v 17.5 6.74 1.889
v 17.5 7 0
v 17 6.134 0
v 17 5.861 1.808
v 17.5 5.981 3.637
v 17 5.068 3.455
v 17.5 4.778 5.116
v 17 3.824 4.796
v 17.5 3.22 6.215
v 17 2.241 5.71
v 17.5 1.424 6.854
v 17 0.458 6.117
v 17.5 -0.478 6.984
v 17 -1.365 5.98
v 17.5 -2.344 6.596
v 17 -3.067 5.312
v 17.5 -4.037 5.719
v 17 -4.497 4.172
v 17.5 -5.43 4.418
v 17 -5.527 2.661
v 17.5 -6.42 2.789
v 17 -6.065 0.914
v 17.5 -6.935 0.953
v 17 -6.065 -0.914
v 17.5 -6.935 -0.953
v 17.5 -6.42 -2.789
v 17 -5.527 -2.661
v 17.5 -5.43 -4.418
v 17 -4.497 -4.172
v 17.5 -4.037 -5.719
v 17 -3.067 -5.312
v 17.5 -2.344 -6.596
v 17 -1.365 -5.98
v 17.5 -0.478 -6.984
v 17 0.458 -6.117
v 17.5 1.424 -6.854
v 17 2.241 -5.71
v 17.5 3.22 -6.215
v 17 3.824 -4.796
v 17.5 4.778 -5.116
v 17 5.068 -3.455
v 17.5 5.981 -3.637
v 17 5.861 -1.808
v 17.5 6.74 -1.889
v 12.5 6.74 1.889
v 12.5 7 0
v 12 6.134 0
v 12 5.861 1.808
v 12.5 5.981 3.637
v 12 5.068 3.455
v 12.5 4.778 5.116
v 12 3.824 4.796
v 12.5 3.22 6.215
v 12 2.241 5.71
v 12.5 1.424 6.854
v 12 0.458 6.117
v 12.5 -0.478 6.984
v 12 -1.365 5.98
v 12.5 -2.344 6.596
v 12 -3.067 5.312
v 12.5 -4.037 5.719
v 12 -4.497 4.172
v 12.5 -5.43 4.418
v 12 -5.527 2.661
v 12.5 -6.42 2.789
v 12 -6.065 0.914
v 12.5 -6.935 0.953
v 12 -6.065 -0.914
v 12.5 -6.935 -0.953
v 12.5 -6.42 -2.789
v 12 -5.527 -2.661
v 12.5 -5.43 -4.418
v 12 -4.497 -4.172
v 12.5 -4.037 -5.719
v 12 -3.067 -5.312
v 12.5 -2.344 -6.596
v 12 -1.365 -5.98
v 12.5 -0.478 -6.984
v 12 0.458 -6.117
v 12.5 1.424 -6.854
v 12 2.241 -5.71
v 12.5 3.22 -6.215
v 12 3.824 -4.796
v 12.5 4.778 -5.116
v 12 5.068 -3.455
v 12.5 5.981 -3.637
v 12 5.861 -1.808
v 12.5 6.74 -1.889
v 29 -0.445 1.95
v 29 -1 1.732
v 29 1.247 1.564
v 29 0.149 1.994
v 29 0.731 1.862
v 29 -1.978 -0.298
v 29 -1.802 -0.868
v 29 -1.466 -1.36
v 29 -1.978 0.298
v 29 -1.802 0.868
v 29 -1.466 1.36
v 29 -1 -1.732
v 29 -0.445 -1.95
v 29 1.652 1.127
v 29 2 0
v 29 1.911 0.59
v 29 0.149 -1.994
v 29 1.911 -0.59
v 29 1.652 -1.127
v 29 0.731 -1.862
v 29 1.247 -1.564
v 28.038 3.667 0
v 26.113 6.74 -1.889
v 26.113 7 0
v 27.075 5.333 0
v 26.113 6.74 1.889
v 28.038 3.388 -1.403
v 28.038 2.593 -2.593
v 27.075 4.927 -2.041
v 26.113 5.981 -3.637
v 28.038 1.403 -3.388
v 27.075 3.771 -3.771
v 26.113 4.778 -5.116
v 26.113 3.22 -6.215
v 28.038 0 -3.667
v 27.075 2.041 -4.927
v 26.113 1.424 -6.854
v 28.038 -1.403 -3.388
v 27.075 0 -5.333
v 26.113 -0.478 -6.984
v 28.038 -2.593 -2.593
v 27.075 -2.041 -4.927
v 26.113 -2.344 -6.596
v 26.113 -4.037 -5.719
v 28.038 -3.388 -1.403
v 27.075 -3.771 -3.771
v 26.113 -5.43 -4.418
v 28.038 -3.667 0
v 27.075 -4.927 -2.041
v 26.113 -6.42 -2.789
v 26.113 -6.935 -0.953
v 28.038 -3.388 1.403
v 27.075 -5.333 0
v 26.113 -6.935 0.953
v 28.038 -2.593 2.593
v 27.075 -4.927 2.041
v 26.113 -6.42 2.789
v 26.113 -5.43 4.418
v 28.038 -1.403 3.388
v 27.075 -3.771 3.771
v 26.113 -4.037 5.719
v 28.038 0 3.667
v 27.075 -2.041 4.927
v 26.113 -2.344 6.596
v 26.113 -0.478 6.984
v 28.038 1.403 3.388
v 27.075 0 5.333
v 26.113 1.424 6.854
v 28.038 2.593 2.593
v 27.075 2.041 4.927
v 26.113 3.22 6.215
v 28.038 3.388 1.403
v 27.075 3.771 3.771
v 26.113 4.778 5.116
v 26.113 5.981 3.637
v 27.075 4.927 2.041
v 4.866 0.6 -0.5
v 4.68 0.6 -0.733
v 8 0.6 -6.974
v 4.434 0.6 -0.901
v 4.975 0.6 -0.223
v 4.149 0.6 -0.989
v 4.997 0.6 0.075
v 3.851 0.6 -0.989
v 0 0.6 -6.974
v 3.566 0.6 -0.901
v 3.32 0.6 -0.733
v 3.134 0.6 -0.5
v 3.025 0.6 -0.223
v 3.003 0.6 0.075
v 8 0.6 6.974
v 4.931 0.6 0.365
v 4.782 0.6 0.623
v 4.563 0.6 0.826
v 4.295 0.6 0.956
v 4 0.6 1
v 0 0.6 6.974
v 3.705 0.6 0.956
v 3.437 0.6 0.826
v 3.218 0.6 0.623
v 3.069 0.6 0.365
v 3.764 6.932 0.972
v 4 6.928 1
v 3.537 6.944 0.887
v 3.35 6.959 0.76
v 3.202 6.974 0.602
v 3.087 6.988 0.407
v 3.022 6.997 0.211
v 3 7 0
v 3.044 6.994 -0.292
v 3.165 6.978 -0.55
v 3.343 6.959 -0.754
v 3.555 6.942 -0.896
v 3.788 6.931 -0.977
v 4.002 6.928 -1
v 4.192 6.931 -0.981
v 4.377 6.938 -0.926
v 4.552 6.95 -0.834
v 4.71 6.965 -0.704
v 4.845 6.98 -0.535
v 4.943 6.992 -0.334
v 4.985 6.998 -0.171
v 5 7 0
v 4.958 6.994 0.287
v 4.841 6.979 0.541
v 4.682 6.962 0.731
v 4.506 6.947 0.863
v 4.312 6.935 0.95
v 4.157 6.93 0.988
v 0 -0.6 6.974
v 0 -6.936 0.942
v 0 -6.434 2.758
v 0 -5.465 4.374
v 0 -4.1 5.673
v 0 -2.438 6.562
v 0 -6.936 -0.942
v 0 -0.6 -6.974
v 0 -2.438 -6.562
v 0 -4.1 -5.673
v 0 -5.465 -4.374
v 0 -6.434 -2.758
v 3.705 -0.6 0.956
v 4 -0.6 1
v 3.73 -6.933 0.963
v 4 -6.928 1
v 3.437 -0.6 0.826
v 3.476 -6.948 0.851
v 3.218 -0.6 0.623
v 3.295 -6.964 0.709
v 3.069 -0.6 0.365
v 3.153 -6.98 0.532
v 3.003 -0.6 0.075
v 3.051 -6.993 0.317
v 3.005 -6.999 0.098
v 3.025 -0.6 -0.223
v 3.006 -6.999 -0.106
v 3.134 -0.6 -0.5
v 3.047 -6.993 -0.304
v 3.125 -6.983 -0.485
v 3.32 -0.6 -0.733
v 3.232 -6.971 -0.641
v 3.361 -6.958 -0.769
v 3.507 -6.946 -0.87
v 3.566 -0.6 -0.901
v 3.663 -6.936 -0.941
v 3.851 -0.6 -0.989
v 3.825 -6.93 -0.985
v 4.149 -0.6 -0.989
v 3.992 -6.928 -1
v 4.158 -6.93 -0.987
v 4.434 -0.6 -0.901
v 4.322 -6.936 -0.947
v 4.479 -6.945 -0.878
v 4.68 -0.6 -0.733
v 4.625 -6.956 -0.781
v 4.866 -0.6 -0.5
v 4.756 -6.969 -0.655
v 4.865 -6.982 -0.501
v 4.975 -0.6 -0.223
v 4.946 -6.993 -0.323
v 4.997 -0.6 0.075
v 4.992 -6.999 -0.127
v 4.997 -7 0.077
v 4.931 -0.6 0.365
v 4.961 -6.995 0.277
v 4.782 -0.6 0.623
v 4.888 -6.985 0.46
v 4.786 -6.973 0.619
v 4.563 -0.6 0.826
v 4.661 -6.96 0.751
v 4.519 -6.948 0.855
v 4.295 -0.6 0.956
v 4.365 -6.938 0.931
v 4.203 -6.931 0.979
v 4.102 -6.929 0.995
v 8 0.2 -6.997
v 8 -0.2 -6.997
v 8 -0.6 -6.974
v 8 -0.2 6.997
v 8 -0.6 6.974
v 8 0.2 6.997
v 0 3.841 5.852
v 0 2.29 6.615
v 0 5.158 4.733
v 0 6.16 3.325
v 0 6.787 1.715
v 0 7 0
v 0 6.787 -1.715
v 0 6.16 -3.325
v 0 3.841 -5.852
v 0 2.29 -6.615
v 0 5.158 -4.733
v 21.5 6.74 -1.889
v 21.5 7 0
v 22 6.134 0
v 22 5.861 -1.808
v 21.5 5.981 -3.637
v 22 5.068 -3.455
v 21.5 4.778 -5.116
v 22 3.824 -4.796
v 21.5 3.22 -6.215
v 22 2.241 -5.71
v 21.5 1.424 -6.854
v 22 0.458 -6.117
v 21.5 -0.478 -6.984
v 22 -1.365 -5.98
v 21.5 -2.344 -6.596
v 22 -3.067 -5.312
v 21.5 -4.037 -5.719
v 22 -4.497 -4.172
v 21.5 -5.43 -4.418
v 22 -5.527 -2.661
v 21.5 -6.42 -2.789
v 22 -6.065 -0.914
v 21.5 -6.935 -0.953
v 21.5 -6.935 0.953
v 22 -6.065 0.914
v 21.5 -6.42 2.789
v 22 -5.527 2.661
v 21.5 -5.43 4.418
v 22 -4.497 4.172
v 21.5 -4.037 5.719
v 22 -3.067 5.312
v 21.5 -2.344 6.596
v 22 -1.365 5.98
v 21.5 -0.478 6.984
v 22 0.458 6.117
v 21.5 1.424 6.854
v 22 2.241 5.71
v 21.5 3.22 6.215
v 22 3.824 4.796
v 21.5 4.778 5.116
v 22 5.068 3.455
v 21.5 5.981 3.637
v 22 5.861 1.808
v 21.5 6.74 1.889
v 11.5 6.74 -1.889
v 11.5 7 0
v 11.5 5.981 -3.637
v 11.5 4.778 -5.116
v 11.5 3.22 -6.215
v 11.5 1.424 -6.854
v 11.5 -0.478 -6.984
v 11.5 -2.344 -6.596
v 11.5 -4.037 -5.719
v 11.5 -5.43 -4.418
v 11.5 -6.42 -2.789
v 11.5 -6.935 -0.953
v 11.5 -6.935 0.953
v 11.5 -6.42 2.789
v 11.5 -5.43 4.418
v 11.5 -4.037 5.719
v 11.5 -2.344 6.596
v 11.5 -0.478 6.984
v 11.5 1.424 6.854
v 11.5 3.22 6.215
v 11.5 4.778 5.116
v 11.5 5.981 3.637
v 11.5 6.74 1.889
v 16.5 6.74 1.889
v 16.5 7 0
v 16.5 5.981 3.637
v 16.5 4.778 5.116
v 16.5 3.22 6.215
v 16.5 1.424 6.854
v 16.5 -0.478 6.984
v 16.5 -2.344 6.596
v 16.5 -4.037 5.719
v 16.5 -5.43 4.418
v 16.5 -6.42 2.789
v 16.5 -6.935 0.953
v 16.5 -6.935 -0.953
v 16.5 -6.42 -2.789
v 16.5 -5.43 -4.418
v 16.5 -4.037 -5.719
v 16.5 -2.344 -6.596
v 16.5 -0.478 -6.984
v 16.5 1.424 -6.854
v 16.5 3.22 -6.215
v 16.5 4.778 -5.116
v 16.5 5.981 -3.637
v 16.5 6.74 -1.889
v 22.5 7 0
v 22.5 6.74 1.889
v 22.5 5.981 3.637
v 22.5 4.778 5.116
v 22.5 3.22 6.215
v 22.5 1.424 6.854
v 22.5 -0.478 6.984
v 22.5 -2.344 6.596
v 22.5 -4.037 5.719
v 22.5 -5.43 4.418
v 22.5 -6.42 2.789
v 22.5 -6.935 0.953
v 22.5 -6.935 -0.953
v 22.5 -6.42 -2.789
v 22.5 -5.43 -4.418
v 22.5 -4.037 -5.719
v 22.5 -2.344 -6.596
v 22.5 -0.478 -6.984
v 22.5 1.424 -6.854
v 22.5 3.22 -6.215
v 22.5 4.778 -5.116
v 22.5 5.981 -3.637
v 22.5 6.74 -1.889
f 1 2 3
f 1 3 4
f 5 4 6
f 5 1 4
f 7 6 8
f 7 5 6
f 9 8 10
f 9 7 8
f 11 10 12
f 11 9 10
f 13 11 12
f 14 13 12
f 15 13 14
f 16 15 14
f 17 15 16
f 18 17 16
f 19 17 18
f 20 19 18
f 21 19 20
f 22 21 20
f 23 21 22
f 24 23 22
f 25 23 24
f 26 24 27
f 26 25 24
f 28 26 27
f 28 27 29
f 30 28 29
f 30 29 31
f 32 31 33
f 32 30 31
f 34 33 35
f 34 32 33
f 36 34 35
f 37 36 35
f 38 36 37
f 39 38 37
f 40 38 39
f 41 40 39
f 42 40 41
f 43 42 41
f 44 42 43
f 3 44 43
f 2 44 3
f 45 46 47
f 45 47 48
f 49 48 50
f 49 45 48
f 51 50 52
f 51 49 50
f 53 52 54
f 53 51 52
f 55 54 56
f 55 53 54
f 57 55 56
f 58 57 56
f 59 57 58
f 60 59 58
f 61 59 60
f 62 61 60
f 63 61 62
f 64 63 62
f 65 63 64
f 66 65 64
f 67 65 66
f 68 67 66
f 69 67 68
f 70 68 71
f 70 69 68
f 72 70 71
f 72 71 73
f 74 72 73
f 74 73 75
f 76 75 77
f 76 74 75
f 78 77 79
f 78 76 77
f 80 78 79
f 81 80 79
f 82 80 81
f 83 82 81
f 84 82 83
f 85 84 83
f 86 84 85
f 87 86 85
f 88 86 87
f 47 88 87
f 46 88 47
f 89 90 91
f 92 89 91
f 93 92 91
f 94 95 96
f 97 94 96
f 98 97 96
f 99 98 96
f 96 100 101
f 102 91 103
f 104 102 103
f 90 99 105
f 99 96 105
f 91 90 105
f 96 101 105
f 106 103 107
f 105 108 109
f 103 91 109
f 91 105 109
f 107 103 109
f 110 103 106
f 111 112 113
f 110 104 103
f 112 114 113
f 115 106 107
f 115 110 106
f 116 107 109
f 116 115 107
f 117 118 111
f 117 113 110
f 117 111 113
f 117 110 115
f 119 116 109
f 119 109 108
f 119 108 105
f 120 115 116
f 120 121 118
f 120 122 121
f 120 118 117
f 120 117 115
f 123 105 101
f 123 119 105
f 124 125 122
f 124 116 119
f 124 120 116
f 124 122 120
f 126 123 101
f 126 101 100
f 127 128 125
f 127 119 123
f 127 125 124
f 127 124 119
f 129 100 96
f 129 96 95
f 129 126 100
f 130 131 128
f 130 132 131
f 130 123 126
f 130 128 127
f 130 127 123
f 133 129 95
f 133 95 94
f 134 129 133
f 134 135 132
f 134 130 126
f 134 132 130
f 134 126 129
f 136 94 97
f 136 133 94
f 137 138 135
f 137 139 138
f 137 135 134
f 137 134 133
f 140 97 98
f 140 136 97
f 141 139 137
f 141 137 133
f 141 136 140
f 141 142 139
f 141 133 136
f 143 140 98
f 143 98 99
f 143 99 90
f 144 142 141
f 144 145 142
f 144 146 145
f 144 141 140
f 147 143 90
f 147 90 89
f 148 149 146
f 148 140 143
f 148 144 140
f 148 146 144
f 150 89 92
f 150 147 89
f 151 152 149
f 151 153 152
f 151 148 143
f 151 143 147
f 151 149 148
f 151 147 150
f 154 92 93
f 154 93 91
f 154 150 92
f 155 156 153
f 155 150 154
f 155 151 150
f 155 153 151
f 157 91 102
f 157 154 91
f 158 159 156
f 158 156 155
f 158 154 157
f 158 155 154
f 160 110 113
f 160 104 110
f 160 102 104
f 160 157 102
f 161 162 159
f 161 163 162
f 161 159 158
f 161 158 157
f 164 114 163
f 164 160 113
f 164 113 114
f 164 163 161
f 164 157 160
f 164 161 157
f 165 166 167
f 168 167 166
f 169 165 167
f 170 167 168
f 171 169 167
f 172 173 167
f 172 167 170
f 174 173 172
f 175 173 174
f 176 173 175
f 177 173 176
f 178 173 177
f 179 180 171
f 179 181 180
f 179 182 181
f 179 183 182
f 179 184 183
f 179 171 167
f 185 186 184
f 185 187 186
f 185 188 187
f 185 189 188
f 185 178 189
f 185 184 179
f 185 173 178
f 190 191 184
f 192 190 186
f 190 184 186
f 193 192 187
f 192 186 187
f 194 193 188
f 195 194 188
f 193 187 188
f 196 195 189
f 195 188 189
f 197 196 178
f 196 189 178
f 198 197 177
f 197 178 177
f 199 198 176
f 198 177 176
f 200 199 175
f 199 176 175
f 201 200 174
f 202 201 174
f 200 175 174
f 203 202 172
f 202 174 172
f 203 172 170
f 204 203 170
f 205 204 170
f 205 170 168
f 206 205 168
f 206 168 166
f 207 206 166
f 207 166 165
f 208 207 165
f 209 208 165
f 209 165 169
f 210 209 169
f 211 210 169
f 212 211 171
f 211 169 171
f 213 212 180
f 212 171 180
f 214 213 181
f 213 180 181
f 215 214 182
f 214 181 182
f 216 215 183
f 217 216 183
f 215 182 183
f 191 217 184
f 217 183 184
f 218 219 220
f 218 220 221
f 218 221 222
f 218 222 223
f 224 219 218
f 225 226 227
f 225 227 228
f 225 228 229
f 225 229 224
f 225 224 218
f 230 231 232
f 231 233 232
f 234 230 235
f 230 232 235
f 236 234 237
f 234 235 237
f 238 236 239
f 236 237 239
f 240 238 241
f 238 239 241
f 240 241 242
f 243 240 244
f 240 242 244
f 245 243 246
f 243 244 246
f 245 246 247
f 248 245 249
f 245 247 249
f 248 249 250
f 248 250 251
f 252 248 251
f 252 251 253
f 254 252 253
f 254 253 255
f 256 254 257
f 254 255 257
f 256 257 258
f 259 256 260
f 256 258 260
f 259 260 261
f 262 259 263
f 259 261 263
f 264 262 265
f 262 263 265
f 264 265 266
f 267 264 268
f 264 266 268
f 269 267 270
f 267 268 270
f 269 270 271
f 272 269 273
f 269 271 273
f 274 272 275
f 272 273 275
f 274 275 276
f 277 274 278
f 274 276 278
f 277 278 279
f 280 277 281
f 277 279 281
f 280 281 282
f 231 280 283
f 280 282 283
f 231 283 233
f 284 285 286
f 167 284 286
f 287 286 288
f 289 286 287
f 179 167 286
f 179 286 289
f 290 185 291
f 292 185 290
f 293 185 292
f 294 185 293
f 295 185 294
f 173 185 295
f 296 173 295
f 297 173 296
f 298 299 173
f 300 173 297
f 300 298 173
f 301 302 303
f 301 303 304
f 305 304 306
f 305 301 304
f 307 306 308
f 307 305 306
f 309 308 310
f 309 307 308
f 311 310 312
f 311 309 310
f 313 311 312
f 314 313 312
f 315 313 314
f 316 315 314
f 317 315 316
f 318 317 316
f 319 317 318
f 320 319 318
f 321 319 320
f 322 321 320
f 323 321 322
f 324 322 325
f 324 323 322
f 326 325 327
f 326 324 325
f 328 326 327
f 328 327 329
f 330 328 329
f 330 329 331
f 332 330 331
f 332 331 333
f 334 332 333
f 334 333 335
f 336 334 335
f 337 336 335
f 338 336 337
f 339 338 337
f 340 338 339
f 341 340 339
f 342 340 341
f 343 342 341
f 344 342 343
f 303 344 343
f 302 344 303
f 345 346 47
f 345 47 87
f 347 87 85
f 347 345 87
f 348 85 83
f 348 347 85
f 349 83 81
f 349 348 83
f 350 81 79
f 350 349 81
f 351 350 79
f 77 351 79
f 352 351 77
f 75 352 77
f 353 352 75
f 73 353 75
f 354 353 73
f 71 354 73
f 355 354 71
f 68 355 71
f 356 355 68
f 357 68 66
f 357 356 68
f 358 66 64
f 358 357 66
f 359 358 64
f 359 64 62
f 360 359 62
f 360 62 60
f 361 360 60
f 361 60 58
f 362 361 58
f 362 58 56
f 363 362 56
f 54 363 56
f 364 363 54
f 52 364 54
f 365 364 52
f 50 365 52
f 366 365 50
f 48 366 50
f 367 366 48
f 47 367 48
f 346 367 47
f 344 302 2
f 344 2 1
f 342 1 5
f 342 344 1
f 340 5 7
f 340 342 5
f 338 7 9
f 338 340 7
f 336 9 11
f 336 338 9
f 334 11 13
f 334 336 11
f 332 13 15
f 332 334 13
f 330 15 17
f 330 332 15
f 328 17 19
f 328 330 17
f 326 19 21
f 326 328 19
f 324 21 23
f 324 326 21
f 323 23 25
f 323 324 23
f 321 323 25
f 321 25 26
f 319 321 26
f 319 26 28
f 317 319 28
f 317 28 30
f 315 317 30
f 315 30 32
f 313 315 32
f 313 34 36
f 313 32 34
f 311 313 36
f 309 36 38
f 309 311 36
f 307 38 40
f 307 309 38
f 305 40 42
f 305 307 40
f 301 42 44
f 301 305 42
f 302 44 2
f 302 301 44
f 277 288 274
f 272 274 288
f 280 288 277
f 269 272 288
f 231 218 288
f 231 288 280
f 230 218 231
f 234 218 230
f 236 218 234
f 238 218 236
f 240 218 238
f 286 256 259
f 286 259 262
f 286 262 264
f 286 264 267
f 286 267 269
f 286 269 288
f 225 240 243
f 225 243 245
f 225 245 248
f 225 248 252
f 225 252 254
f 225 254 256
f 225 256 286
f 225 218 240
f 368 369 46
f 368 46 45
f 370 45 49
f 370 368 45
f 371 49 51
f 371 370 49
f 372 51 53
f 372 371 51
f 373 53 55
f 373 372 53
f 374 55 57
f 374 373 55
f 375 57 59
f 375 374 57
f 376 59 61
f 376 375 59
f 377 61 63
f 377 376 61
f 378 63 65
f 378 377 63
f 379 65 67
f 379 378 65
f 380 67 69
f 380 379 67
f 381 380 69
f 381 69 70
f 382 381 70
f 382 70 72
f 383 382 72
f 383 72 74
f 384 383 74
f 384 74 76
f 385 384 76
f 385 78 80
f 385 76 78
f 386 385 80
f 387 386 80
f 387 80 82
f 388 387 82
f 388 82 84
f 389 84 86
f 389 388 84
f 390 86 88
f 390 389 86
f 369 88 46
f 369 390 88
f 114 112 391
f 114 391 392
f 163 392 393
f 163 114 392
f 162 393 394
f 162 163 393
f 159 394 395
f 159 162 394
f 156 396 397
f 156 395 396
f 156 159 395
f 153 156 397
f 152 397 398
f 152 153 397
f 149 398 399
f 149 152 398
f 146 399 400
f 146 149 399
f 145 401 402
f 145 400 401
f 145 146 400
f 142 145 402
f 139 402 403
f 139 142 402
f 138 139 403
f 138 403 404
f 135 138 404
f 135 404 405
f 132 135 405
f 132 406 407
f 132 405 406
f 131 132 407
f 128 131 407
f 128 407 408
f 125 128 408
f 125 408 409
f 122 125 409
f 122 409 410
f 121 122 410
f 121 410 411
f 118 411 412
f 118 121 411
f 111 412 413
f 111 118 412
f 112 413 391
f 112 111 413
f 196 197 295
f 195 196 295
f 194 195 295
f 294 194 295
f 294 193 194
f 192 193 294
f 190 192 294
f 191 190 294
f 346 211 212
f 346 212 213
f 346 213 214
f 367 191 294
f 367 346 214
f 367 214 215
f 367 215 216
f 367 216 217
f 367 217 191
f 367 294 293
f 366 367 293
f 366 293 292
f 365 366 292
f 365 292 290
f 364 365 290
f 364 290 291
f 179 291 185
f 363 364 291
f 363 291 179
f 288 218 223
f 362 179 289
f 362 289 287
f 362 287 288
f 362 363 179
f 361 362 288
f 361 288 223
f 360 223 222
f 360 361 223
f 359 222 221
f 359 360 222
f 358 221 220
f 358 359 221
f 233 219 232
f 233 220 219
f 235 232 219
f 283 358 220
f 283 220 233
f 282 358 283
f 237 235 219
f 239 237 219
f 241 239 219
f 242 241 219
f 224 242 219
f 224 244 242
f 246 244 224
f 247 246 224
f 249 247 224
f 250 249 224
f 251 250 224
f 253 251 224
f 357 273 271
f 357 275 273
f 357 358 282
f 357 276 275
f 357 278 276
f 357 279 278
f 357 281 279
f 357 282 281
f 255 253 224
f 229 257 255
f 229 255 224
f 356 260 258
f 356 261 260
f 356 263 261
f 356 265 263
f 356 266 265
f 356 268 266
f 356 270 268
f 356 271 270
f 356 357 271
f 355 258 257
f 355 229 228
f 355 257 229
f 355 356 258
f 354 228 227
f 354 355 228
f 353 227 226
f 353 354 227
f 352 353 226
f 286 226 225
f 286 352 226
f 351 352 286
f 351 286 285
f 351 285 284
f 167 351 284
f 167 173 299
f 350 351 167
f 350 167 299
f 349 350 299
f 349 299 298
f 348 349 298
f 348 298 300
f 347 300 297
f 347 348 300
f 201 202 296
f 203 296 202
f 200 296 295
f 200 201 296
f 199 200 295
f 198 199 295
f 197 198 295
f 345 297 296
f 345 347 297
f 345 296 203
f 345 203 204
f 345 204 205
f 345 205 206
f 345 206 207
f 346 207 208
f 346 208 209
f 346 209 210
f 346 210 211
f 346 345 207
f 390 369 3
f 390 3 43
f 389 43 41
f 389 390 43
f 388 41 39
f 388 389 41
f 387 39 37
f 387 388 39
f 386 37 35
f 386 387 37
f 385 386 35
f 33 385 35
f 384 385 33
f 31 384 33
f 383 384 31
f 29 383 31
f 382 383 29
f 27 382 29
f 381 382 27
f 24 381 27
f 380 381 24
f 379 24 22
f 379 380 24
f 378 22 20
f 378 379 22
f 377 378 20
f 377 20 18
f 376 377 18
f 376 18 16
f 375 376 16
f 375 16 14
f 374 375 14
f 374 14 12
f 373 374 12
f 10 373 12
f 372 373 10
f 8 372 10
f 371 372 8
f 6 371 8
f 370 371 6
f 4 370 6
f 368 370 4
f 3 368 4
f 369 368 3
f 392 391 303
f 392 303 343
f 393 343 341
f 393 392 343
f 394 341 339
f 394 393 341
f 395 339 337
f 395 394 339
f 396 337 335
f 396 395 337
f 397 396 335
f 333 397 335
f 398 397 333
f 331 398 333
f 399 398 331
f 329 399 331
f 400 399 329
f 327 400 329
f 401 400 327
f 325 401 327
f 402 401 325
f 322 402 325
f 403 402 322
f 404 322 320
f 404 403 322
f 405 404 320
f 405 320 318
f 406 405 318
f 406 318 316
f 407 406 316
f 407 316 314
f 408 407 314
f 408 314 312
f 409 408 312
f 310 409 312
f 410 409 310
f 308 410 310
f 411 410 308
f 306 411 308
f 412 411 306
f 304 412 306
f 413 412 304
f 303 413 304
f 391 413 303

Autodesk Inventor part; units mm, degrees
ref_plane "YZ Plane" through (0, 0, 0) normal (1, 0, 0) x (0, 1, 0)
ref_plane "XY Plane" through (0, 0, 0) normal (0, 0, 1) x (1, 0, 0)
sketch "Skizze4" plane through (0, 0, 0) normal (0, 0, 1) x (1, 0, 0)
  line L0 (0, 0) -> (0, 7)
  line L1 (0, 7) -> (11.5, 7)
  line L2 (11.5, 7) -> (12, 6.134)
  line L3 (12, 6.134) -> (12.5, 7)
  line L4 (12.5, 7) -> (16.5, 7)
  line L5 (16.5, 7) -> (17, 6.134)
  line L6 (17, 6.134) -> (17.5, 7)
  line L7 (17.5, 7) -> (21.5, 7)
  line L8 (21.5, 7) -> (22, 6.134)
  line L9 (22, 6.134) -> (22.5, 7)
  line L10 (22.5, 7) -> (26.1132, 7)
  line L11 (26.1132, 7) -> (29, 2)
  line L12 (29, 2) -> (29, 0)
  line L13 (29, 0) -> (0, 0)
  line L14 (12, 6.134) -> (12, 7.9514) construction
  line L15 (17, 6.134) -> (17, 8.1262) construction
  line L16 (22, 6.134) -> (22, 7.8166) construction
  point P0 (29, 1)
  dimension "d7" = 1
  dimension "d8" = 60
  dimension "d9" = 4
  dimension "d10" = 14
  dimension "d11" = 7
  dimension "d12" = 29
  dimension "d13" = 12
  dimension "d14" = 17
  dimension "d15" = 30
  dimension "d16" = 1
revolve "Umdrehung1" add sketch "Skizze4" angle 360 about axis through (29, 0, 0) along (-1, 0, 0)
sketch "Skizze5" plane through (0, 0, 0) normal (-1, 0, 0) x (0, 0, 1)
  circle A0 centre (0, 0) radius 7 projected
  line L0 (-7, 0.6) -> (7, 0.6)
  line L1 (7, 0.6) -> (7, -0.6)
  line L2 (7, -0.6) -> (-7, -0.6)
  line L3 (-7, -0.6) -> (-7, 0.6)
  circle A1 centre (0, 0) radius 7 projected
  line L4 (-7, 0) -> (7.2864, 0) construction
  dimension "d18" = 1.2
extrude "Extrusion1" cut sketch "Skizze5" against normal blind 8 contours A0 L2 L0 | L1 L2 A0 | A0 L0 L1 | A0 L3 L0 | L2 L3 A0
ref_plane "Arbeitsebene1" through (0, 0, 0) normal (0, 1, 0) x (-1, 0, 0)
sketch "Skizze6" plane through (0, 0, 0) normal (0, 1, 0) x (-1, 0, 0)
  point P0 (0, 0)
  point P1 (-4, 0)
  dimension "d22" = 4
hole "Bohrung1" at (4, 0, 0) direction (0, -1, 0) diameter 2 end through all both
properties part number "arbeitskolben" material "Blei"
